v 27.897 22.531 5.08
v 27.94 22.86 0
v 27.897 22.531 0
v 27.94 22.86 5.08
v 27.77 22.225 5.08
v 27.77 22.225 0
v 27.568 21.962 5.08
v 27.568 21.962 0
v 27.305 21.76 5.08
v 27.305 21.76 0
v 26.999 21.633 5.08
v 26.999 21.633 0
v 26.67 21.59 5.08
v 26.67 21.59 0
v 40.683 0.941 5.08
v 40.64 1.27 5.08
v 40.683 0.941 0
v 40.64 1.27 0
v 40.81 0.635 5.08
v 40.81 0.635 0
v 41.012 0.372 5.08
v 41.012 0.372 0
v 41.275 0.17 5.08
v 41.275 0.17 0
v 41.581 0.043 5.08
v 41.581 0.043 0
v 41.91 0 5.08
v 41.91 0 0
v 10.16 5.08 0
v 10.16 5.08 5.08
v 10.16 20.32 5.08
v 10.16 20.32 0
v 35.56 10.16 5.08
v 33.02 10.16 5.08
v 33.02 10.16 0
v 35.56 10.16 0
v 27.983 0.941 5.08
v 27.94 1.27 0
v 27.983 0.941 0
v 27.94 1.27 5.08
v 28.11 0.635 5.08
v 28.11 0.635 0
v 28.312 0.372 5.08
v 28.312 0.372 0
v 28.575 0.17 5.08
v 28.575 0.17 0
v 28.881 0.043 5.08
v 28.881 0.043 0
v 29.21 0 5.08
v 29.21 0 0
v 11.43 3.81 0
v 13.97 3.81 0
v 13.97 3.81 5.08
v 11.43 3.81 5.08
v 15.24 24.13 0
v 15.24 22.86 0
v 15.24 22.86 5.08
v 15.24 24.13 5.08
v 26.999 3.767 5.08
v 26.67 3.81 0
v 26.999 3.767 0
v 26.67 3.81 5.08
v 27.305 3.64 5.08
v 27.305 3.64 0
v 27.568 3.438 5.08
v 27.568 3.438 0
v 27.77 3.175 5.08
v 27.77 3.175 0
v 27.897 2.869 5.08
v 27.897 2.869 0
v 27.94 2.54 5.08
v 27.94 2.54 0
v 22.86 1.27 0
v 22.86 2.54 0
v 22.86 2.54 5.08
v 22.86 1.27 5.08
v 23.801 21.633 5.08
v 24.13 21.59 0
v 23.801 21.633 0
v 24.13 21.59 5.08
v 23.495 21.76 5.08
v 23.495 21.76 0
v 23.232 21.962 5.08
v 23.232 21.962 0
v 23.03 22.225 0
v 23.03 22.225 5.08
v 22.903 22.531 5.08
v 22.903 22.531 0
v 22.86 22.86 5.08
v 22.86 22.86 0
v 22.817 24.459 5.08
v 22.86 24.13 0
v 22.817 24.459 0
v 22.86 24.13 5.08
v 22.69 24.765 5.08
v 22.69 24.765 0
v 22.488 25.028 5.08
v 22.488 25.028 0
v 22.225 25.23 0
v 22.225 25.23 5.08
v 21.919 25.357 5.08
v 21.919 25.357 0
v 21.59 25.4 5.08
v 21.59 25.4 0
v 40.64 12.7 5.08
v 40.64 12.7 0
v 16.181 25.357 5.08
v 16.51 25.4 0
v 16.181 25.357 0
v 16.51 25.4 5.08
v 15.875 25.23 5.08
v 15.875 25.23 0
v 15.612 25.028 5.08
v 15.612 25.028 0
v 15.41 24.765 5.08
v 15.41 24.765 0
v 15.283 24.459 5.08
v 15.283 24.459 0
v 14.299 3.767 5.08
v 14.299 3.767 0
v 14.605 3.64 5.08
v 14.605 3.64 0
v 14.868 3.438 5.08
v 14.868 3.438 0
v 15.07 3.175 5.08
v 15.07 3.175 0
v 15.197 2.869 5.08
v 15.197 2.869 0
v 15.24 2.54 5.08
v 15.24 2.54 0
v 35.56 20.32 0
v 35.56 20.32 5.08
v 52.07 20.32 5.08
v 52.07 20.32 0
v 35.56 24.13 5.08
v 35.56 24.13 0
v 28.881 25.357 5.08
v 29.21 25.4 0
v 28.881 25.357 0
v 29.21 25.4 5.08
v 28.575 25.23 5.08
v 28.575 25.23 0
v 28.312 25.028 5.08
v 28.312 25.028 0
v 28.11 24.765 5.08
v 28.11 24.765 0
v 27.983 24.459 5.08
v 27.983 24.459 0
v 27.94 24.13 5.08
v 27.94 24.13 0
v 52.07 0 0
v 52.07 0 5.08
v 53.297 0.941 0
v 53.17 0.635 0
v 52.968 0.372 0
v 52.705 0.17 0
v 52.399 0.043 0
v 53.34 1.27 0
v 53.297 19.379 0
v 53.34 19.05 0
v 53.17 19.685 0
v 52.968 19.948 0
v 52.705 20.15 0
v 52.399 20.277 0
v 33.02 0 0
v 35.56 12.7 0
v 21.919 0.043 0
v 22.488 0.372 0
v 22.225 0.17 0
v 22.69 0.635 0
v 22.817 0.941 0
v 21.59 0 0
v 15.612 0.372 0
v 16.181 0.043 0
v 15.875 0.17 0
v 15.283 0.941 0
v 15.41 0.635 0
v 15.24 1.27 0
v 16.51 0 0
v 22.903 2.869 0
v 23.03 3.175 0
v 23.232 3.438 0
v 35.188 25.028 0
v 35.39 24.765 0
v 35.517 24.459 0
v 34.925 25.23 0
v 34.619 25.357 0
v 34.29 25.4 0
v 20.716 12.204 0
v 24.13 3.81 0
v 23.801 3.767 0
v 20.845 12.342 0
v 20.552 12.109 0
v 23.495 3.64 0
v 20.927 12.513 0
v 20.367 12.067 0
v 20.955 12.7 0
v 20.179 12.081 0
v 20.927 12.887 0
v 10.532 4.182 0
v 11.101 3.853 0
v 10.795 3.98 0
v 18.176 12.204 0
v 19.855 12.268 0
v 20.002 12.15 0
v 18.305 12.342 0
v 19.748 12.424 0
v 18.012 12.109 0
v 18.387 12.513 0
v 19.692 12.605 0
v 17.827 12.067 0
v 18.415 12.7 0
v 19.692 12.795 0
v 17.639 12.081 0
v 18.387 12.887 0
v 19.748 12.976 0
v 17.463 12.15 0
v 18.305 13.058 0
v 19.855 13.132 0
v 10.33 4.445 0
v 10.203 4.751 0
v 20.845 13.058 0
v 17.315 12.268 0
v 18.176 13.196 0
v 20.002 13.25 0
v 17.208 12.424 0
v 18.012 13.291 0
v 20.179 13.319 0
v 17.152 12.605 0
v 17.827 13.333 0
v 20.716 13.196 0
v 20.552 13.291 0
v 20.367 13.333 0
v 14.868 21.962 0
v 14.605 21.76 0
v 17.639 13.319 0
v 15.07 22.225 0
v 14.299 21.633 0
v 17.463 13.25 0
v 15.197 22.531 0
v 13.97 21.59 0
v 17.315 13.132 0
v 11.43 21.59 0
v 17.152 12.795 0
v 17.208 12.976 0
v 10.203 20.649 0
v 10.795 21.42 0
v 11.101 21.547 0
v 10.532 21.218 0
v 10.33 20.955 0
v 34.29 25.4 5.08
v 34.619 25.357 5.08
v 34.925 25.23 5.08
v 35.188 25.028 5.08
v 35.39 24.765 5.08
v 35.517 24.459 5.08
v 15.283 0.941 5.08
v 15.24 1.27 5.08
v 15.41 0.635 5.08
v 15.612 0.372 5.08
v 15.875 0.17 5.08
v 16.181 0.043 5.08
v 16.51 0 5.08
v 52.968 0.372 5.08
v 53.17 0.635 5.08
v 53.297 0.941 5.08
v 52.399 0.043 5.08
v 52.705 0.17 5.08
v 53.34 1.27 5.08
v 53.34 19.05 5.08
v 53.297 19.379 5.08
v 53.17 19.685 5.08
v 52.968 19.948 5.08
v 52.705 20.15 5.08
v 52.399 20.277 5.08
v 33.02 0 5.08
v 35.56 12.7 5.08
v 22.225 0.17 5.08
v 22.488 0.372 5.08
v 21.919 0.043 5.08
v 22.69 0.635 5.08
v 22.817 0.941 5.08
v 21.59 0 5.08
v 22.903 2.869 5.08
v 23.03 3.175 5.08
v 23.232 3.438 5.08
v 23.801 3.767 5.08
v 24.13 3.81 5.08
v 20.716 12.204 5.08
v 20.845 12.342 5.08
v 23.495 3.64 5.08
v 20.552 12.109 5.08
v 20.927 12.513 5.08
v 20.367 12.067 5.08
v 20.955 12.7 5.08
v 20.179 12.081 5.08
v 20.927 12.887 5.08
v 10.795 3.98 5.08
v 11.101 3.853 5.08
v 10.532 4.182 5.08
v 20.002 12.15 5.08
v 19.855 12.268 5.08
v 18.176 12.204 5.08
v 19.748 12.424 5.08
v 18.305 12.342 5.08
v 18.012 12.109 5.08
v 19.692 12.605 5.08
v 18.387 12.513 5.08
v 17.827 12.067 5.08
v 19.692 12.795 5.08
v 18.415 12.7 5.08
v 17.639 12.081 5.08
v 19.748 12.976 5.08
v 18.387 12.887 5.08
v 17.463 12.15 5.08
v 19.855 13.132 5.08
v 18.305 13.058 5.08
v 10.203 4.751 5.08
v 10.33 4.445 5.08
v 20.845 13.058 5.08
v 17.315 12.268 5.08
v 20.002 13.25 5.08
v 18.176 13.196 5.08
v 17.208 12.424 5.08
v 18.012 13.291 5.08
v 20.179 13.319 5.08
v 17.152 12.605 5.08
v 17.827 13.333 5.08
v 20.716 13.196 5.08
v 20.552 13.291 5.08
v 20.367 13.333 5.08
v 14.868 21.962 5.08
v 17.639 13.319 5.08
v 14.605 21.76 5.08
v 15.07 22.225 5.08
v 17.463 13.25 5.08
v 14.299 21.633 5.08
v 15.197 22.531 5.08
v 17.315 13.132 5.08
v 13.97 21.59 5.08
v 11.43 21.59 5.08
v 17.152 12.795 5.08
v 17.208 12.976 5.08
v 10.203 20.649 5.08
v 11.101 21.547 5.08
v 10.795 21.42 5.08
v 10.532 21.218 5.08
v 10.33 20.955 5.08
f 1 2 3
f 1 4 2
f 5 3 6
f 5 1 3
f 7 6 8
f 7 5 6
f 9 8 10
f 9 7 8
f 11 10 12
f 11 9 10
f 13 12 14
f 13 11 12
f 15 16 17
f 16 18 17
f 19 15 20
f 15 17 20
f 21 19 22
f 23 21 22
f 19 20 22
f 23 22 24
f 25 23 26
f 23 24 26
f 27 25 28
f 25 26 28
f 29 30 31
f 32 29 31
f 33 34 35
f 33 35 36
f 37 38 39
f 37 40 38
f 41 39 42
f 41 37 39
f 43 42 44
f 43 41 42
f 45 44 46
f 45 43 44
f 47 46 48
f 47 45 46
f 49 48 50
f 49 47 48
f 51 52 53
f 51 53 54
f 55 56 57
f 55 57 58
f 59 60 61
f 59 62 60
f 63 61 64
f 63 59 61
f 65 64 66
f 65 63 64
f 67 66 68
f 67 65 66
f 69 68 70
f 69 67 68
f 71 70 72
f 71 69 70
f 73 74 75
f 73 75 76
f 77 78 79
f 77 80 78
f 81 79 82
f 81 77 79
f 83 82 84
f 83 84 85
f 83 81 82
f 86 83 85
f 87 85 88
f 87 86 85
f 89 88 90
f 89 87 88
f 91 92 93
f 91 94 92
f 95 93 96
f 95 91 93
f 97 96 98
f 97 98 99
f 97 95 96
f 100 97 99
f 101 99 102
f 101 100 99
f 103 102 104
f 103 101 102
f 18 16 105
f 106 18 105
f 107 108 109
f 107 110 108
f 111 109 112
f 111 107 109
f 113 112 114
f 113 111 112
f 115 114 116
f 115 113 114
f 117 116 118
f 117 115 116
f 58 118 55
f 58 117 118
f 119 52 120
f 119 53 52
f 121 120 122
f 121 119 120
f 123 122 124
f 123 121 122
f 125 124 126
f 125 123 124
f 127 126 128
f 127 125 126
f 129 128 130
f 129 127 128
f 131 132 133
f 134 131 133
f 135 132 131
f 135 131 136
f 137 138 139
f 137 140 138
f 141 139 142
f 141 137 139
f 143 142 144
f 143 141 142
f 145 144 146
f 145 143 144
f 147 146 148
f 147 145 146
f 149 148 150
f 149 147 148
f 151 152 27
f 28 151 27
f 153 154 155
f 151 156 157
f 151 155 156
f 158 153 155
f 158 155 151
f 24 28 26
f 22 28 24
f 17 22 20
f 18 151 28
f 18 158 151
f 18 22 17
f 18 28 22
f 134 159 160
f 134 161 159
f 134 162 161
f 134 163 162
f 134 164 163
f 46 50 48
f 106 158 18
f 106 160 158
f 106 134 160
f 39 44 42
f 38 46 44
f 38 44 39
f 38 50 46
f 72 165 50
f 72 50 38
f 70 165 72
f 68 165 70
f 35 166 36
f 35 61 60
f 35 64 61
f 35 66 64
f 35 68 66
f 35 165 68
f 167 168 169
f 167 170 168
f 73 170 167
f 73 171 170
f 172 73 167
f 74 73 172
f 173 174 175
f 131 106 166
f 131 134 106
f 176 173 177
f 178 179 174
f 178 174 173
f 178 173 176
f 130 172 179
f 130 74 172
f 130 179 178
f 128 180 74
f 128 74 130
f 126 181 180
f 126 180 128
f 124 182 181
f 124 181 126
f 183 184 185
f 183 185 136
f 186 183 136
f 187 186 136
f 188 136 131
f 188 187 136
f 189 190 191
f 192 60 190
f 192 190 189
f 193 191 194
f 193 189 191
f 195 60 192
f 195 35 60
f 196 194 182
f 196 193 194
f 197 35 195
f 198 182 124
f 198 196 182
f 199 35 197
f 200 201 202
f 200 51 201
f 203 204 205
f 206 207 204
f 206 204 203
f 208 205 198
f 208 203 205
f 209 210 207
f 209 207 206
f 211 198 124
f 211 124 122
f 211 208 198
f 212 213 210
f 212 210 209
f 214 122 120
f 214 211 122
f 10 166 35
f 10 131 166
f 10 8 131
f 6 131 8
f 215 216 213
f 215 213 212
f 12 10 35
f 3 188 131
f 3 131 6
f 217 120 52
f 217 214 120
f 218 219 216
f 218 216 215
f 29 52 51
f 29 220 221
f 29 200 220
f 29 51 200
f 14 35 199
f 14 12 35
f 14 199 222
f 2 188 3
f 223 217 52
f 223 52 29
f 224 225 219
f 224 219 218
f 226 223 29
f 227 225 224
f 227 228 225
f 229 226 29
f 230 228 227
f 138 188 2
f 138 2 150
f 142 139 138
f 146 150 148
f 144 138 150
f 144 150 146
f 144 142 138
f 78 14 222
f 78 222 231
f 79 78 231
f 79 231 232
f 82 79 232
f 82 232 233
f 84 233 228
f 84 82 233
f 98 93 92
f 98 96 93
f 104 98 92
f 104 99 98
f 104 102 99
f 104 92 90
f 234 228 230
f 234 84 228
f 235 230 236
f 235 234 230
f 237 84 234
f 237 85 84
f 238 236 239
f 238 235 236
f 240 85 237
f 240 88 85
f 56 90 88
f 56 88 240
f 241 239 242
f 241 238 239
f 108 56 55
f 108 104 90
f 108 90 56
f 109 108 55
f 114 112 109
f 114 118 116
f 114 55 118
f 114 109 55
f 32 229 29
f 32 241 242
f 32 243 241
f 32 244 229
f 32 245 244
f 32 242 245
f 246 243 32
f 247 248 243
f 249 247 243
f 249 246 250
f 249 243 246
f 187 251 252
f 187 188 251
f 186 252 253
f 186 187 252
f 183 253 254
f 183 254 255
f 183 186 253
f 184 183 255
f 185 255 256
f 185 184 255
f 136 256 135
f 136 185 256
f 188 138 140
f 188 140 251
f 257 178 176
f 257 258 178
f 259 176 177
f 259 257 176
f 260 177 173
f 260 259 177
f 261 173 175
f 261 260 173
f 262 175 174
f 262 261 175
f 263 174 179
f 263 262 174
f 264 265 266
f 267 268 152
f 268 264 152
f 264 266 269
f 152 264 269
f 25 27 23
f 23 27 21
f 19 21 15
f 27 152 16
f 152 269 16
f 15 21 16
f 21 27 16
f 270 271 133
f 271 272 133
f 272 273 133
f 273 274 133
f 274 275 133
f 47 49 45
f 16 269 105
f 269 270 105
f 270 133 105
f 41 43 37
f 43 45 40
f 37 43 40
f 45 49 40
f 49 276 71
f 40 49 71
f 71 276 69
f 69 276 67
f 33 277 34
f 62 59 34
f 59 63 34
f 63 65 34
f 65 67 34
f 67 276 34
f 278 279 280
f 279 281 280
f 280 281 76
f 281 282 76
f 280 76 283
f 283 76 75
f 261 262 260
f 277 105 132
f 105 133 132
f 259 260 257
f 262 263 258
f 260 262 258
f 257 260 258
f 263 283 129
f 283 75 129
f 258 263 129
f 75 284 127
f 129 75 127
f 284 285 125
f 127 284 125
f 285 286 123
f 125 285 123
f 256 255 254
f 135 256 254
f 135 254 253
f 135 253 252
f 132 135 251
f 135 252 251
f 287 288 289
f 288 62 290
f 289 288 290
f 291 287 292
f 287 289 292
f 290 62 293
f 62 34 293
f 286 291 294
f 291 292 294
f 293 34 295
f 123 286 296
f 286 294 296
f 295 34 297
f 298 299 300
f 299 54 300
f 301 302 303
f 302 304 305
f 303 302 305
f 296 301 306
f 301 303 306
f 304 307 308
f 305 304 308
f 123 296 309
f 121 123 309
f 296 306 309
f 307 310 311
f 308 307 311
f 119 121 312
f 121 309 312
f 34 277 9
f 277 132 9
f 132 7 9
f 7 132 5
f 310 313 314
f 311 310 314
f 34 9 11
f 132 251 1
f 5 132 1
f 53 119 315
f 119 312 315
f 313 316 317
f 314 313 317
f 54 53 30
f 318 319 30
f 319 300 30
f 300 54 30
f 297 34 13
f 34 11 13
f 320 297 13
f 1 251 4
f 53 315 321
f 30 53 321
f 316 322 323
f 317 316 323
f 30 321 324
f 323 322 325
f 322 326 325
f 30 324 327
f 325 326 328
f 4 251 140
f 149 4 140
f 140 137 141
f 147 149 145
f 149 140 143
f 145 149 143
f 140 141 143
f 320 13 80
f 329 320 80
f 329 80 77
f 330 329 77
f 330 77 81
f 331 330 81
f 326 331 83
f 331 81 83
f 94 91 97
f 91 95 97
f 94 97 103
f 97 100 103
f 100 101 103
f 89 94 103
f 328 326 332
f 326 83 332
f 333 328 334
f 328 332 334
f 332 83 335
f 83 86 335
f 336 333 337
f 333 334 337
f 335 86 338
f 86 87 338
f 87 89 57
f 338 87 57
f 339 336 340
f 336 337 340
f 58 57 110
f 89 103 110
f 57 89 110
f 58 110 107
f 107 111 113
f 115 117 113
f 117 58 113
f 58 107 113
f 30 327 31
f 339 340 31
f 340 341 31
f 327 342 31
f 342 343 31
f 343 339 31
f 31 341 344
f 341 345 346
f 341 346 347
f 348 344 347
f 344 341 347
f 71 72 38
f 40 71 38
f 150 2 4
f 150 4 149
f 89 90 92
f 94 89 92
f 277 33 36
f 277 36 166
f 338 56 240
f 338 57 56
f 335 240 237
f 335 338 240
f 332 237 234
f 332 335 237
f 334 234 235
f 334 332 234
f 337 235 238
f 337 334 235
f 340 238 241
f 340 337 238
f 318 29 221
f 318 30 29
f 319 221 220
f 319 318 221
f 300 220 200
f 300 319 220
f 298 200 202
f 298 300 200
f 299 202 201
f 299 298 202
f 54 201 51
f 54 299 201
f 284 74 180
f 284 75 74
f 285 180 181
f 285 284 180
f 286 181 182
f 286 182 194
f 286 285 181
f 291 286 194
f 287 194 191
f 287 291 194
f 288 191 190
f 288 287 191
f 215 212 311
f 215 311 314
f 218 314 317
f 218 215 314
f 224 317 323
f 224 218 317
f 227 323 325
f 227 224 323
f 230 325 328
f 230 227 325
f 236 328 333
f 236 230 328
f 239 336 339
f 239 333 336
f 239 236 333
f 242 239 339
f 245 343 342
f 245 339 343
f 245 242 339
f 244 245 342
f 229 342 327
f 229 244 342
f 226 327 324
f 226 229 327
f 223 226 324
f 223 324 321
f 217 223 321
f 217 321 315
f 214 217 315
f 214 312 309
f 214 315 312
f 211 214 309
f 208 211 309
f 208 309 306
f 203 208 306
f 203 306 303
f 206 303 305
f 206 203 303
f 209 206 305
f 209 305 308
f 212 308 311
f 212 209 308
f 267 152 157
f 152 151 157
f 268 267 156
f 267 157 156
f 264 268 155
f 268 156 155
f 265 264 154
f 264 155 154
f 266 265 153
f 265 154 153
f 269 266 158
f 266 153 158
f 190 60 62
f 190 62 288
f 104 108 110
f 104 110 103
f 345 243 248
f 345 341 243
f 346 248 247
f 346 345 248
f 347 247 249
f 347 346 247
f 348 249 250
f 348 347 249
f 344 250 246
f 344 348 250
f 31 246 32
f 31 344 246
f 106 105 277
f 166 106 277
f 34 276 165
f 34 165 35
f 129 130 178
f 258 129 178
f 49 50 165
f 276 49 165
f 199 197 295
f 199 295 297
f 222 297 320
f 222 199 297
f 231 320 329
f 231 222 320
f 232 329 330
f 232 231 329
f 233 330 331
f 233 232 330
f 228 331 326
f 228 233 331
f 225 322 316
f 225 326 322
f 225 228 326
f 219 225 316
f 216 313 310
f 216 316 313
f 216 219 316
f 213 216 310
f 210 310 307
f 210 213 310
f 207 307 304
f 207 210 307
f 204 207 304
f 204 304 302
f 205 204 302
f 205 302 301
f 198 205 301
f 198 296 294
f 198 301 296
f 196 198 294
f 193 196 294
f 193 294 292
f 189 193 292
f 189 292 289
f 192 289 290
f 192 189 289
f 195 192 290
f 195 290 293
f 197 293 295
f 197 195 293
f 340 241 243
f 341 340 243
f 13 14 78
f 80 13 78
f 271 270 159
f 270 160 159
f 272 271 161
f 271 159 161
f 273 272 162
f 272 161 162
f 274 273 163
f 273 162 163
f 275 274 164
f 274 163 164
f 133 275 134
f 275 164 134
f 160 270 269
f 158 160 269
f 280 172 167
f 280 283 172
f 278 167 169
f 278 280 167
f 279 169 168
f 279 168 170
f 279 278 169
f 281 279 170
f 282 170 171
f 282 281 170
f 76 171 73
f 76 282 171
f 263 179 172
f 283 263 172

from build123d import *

# Parameters (mm, degrees)
SKETCH1_W               = 38.1
SKETCH1_H               = 25.4
BOSS_EXTRUDE1_DEPTH     = 5.08
CUT_EXTRUDE1_DEPTH      = 47.071427154
CUT_EXTRUDE1_DEPTH_BACK = 47.071427154
SKETCH2_R               = 0.635
SKETCH3_W               = 5.08
SKETCH3_H               = 3.81
CUT_EXTRUDE2_DEPTH      = 47.071427154
SKETCH4_W               = 2.54
SKETCH4_H               = 12.7
CUT_EXTRUDE3_DEPTH      = 47.071427154
BOSS_EXTRUDE2_DEPTH     = 5.08
SKETCH6_W               = 10.16
SKETCH6_H               = 25.4
CUT_EXTRUDE4_DEPTH      = 60.296897052
SKETCH7_W               = 2.54
SKETCH7_H               = 5.08
CUT_EXTRUDE5_DEPTH      = 60.296897052
FILLET1_R               = 1.27
SKETCH8_W               = 2.54
SKETCH8_H               = 10.16
CUT_EXTRUDE6_DEPTH      = 60.296897052
FILLET2_R               = 1.27


with BuildPart() as part:
    # Sketch1 → Boss-Extrude1 (new body)
    with BuildSketch(Plane.XY):
        with Locations((19.05, 12.7)):
            Rectangle(SKETCH1_W, SKETCH1_H)
    extrude(amount=BOSS_EXTRUDE1_DEPTH)

    # Sketch2 → Cut-Extrude1 (cut, two sides: drawn at the far end of the back side and taken through both)
    with BuildSketch(Plane.XY.offset(5.08).offset(-CUT_EXTRUDE1_DEPTH_BACK)):
        with Locations((17.78, 12.7)):
            Circle(SKETCH2_R)
        with Locations((20.32, 12.7)):
            Circle(SKETCH2_R)
    extrude(amount=CUT_EXTRUDE1_DEPTH + CUT_EXTRUDE1_DEPTH_BACK, mode=Mode.SUBTRACT)

    # Sketch3 → Cut-Extrude2 (cut, through all)
    with BuildSketch(Plane(origin=(0, 0, 0), x_dir=(-1, 0, 0), z_dir=(0, 0, -1))):
        with Locations((-25.4, 23.495)):
            Rectangle(SKETCH3_W, SKETCH3_H)
        with Locations((-12.7, 23.495)):
            Rectangle(SKETCH3_W, SKETCH3_H)
    cut_extrude2 = extrude(amount=-CUT_EXTRUDE2_DEPTH, mode=Mode.SUBTRACT)

    # Mirror1: Cut-Extrude2 across plane
    add(cut_extrude2.mirror(Plane.ZX.offset(12.7)), mode=Mode.SUBTRACT)

    # Sketch4 → Cut-Extrude3 (cut, through all)
    with BuildSketch(Plane.XY.offset(5.08)):
        with Locations((36.83, 6.35)):
            Rectangle(SKETCH4_W, SKETCH4_H)
    extrude(amount=-CUT_EXTRUDE3_DEPTH, mode=Mode.SUBTRACT)

    # Sketch5 → Boss-Extrude2 (add, through all)
    with BuildSketch(Plane.XY.offset(5.08)):
        Polygon((38.1, 20.32), (53.34, 20.32), (53.34, 0), (40.64, 0), (40.64, 12.7), (38.1, 12.7), align=None)
    extrude(amount=-BOSS_EXTRUDE2_DEPTH)

    # Sketch6 → Cut-Extrude4 (cut, through all)
    with BuildSketch(Plane.XY.offset(5.08)):
        with Locations((5.08, 12.7)):
            Rectangle(SKETCH6_W, SKETCH6_H)
    extrude(amount=-CUT_EXTRUDE4_DEPTH, mode=Mode.SUBTRACT)

    # Sketch7 → Cut-Extrude5 (cut, through all)
    with BuildSketch(Plane.XY.offset(5.08)):
        with Locations((36.83, 22.86)):
            Rectangle(SKETCH7_W, SKETCH7_H)
    extrude(amount=-CUT_EXTRUDE5_DEPTH, mode=Mode.SUBTRACT)

    # Fillet1
    fillet1_edges = [part.edges().sort_by_distance(p)[0] for p in [
        (35.56, 25.4, 2.54),
        (27.94, 21.59, 2.54),
        (27.94, 25.4, 2.54),
        (22.86, 25.4, 2.54),
        (22.86, 21.59, 2.54),
        (15.24, 21.59, 2.54),
        (15.24, 25.4, 2.54),
        (10.16, 21.59, 2.54),
        (27.94, 0, 2.54),
        (27.94, 3.81, 2.54),
        (22.86, 3.81, 2.54),
        (22.86, 0, 2.54),
        (15.24, 0, 2.54),
        (15.24, 3.81, 2.54),
        (10.16, 3.81, 2.54),
    ]]
    fillet(fillet1_edges, radius=FILLET1_R)

    # Sketch8 → Cut-Extrude6 (cut, through all)
    with BuildSketch(Plane.XY.offset(5.08)):
        with Locations((34.29, 5.08)):
            Rectangle(SKETCH8_W, SKETCH8_H)
    extrude(amount=-CUT_EXTRUDE6_DEPTH, mode=Mode.SUBTRACT)

    # Fillet2
    fillet2_edges = [part.edges().sort_by_distance(p)[0] for p in [
        (53.34, 20.32, 2.54),
        (53.34, 0, 2.54),
        (40.64, 0, 2.54),
    ]]
    fillet(fillet2_edges, radius=FILLET2_R)


solid = part.part
